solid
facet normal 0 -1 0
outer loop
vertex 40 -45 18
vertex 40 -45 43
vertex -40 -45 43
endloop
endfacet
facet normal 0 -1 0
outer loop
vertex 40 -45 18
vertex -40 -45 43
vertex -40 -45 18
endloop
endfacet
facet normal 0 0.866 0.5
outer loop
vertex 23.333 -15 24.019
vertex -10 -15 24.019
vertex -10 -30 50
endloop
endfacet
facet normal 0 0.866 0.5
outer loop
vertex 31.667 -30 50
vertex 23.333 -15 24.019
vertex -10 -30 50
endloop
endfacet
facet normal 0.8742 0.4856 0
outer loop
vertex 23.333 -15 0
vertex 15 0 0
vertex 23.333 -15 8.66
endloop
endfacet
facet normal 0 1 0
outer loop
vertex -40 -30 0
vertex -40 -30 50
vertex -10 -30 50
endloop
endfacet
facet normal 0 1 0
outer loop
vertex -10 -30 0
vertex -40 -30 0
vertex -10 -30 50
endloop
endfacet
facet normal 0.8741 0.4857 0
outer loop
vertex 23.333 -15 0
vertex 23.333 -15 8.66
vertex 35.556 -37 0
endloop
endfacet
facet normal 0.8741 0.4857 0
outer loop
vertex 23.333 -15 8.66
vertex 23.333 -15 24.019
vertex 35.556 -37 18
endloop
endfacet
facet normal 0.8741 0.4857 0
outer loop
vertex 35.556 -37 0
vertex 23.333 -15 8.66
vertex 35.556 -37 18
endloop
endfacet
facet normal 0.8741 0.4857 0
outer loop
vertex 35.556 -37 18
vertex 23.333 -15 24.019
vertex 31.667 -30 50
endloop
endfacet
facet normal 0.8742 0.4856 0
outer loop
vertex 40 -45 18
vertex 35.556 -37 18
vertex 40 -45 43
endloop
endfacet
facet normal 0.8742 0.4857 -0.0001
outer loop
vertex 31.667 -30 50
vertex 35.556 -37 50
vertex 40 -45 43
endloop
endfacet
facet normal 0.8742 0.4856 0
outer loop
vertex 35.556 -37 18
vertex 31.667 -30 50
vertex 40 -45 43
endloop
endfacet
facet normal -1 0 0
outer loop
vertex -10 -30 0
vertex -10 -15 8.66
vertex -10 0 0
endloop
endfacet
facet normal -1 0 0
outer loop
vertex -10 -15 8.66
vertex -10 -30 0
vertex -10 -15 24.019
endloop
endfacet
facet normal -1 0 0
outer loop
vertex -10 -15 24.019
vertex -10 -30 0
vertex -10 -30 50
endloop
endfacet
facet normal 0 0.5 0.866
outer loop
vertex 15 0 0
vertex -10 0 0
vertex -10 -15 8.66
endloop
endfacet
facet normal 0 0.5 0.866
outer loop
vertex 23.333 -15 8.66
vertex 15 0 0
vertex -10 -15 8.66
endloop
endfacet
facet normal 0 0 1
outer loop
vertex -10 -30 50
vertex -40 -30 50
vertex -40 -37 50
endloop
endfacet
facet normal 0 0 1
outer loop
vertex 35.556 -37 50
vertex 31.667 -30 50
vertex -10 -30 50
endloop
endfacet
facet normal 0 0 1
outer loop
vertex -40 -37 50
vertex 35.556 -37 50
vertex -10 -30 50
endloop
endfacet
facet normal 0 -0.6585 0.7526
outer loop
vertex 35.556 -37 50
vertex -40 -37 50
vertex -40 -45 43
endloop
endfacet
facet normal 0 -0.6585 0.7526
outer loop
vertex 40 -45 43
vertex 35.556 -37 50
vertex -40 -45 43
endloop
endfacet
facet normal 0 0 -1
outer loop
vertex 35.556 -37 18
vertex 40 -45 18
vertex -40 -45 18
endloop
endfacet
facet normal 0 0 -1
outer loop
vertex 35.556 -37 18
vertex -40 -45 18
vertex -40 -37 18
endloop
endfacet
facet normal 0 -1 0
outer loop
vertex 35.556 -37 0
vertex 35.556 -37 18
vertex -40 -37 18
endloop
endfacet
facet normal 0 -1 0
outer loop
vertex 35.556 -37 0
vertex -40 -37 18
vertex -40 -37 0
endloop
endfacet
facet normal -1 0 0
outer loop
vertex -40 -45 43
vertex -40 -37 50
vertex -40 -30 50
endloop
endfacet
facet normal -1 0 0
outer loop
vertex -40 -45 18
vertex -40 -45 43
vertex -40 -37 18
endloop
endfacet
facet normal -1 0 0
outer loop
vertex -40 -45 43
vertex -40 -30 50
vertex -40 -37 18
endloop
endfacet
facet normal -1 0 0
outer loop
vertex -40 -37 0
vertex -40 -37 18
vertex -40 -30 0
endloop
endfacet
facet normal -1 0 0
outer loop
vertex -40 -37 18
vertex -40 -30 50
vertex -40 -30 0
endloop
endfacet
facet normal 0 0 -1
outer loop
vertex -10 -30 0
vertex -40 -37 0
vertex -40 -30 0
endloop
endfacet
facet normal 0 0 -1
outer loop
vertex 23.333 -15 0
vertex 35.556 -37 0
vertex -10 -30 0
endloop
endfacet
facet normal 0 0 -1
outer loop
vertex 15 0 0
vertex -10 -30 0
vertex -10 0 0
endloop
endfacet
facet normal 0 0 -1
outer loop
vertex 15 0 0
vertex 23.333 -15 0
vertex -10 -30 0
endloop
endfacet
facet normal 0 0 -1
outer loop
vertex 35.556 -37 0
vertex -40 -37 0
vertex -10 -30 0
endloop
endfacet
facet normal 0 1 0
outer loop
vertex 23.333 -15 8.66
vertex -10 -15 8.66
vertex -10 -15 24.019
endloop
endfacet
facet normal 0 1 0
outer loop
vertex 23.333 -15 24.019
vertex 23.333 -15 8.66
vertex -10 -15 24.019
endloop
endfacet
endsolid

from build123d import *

# Parameters (mm, degrees)
BOSS_EXTRUDE3_DEPTH = 40
CUT_EXTRUDE1_DEPTH  = 51
CUT_EXTRUDE3_DEPTH  = 51


with BuildPart() as part:
    # Sketch8 → Boss-Extrude3 (new body, symmetric)
    with BuildSketch(Plane(origin=(0, 0, 0), x_dir=(0, 0, -1), z_dir=(1, 0, 0))):
        Polygon((-50, -30), (-50, -37), (-43, -45), (-18, -45), (-18, -37), (0, -37), (0, 0), (-8.660254038, -15), (-24.019237886, -15), align=None)
    extrude(amount=BOSS_EXTRUDE3_DEPTH, both=True)

    # Sketch10 → Cut-Extrude1 (cut, through all)
    with BuildSketch(Plane.XY.offset(50)):
        Polygon((-10, 0), (-40, 0), (-40, -15), (-40, -30), (-10, -30), align=None)
    extrude(amount=-CUT_EXTRUDE1_DEPTH, mode=Mode.SUBTRACT)

    # Sketch11 → Cut-Extrude3 (cut, through all)
    with BuildSketch(Plane.XY.offset(50)):
        Polygon((40, 0), (15, 0), (23.333333333, -15), (40, -15), align=None)
        Polygon((40, -15), (23.333333333, -15), (40, -45), (40, -37), (40, -30), align=None)
    extrude(amount=-CUT_EXTRUDE3_DEPTH, mode=Mode.SUBTRACT)


solid = part.part
